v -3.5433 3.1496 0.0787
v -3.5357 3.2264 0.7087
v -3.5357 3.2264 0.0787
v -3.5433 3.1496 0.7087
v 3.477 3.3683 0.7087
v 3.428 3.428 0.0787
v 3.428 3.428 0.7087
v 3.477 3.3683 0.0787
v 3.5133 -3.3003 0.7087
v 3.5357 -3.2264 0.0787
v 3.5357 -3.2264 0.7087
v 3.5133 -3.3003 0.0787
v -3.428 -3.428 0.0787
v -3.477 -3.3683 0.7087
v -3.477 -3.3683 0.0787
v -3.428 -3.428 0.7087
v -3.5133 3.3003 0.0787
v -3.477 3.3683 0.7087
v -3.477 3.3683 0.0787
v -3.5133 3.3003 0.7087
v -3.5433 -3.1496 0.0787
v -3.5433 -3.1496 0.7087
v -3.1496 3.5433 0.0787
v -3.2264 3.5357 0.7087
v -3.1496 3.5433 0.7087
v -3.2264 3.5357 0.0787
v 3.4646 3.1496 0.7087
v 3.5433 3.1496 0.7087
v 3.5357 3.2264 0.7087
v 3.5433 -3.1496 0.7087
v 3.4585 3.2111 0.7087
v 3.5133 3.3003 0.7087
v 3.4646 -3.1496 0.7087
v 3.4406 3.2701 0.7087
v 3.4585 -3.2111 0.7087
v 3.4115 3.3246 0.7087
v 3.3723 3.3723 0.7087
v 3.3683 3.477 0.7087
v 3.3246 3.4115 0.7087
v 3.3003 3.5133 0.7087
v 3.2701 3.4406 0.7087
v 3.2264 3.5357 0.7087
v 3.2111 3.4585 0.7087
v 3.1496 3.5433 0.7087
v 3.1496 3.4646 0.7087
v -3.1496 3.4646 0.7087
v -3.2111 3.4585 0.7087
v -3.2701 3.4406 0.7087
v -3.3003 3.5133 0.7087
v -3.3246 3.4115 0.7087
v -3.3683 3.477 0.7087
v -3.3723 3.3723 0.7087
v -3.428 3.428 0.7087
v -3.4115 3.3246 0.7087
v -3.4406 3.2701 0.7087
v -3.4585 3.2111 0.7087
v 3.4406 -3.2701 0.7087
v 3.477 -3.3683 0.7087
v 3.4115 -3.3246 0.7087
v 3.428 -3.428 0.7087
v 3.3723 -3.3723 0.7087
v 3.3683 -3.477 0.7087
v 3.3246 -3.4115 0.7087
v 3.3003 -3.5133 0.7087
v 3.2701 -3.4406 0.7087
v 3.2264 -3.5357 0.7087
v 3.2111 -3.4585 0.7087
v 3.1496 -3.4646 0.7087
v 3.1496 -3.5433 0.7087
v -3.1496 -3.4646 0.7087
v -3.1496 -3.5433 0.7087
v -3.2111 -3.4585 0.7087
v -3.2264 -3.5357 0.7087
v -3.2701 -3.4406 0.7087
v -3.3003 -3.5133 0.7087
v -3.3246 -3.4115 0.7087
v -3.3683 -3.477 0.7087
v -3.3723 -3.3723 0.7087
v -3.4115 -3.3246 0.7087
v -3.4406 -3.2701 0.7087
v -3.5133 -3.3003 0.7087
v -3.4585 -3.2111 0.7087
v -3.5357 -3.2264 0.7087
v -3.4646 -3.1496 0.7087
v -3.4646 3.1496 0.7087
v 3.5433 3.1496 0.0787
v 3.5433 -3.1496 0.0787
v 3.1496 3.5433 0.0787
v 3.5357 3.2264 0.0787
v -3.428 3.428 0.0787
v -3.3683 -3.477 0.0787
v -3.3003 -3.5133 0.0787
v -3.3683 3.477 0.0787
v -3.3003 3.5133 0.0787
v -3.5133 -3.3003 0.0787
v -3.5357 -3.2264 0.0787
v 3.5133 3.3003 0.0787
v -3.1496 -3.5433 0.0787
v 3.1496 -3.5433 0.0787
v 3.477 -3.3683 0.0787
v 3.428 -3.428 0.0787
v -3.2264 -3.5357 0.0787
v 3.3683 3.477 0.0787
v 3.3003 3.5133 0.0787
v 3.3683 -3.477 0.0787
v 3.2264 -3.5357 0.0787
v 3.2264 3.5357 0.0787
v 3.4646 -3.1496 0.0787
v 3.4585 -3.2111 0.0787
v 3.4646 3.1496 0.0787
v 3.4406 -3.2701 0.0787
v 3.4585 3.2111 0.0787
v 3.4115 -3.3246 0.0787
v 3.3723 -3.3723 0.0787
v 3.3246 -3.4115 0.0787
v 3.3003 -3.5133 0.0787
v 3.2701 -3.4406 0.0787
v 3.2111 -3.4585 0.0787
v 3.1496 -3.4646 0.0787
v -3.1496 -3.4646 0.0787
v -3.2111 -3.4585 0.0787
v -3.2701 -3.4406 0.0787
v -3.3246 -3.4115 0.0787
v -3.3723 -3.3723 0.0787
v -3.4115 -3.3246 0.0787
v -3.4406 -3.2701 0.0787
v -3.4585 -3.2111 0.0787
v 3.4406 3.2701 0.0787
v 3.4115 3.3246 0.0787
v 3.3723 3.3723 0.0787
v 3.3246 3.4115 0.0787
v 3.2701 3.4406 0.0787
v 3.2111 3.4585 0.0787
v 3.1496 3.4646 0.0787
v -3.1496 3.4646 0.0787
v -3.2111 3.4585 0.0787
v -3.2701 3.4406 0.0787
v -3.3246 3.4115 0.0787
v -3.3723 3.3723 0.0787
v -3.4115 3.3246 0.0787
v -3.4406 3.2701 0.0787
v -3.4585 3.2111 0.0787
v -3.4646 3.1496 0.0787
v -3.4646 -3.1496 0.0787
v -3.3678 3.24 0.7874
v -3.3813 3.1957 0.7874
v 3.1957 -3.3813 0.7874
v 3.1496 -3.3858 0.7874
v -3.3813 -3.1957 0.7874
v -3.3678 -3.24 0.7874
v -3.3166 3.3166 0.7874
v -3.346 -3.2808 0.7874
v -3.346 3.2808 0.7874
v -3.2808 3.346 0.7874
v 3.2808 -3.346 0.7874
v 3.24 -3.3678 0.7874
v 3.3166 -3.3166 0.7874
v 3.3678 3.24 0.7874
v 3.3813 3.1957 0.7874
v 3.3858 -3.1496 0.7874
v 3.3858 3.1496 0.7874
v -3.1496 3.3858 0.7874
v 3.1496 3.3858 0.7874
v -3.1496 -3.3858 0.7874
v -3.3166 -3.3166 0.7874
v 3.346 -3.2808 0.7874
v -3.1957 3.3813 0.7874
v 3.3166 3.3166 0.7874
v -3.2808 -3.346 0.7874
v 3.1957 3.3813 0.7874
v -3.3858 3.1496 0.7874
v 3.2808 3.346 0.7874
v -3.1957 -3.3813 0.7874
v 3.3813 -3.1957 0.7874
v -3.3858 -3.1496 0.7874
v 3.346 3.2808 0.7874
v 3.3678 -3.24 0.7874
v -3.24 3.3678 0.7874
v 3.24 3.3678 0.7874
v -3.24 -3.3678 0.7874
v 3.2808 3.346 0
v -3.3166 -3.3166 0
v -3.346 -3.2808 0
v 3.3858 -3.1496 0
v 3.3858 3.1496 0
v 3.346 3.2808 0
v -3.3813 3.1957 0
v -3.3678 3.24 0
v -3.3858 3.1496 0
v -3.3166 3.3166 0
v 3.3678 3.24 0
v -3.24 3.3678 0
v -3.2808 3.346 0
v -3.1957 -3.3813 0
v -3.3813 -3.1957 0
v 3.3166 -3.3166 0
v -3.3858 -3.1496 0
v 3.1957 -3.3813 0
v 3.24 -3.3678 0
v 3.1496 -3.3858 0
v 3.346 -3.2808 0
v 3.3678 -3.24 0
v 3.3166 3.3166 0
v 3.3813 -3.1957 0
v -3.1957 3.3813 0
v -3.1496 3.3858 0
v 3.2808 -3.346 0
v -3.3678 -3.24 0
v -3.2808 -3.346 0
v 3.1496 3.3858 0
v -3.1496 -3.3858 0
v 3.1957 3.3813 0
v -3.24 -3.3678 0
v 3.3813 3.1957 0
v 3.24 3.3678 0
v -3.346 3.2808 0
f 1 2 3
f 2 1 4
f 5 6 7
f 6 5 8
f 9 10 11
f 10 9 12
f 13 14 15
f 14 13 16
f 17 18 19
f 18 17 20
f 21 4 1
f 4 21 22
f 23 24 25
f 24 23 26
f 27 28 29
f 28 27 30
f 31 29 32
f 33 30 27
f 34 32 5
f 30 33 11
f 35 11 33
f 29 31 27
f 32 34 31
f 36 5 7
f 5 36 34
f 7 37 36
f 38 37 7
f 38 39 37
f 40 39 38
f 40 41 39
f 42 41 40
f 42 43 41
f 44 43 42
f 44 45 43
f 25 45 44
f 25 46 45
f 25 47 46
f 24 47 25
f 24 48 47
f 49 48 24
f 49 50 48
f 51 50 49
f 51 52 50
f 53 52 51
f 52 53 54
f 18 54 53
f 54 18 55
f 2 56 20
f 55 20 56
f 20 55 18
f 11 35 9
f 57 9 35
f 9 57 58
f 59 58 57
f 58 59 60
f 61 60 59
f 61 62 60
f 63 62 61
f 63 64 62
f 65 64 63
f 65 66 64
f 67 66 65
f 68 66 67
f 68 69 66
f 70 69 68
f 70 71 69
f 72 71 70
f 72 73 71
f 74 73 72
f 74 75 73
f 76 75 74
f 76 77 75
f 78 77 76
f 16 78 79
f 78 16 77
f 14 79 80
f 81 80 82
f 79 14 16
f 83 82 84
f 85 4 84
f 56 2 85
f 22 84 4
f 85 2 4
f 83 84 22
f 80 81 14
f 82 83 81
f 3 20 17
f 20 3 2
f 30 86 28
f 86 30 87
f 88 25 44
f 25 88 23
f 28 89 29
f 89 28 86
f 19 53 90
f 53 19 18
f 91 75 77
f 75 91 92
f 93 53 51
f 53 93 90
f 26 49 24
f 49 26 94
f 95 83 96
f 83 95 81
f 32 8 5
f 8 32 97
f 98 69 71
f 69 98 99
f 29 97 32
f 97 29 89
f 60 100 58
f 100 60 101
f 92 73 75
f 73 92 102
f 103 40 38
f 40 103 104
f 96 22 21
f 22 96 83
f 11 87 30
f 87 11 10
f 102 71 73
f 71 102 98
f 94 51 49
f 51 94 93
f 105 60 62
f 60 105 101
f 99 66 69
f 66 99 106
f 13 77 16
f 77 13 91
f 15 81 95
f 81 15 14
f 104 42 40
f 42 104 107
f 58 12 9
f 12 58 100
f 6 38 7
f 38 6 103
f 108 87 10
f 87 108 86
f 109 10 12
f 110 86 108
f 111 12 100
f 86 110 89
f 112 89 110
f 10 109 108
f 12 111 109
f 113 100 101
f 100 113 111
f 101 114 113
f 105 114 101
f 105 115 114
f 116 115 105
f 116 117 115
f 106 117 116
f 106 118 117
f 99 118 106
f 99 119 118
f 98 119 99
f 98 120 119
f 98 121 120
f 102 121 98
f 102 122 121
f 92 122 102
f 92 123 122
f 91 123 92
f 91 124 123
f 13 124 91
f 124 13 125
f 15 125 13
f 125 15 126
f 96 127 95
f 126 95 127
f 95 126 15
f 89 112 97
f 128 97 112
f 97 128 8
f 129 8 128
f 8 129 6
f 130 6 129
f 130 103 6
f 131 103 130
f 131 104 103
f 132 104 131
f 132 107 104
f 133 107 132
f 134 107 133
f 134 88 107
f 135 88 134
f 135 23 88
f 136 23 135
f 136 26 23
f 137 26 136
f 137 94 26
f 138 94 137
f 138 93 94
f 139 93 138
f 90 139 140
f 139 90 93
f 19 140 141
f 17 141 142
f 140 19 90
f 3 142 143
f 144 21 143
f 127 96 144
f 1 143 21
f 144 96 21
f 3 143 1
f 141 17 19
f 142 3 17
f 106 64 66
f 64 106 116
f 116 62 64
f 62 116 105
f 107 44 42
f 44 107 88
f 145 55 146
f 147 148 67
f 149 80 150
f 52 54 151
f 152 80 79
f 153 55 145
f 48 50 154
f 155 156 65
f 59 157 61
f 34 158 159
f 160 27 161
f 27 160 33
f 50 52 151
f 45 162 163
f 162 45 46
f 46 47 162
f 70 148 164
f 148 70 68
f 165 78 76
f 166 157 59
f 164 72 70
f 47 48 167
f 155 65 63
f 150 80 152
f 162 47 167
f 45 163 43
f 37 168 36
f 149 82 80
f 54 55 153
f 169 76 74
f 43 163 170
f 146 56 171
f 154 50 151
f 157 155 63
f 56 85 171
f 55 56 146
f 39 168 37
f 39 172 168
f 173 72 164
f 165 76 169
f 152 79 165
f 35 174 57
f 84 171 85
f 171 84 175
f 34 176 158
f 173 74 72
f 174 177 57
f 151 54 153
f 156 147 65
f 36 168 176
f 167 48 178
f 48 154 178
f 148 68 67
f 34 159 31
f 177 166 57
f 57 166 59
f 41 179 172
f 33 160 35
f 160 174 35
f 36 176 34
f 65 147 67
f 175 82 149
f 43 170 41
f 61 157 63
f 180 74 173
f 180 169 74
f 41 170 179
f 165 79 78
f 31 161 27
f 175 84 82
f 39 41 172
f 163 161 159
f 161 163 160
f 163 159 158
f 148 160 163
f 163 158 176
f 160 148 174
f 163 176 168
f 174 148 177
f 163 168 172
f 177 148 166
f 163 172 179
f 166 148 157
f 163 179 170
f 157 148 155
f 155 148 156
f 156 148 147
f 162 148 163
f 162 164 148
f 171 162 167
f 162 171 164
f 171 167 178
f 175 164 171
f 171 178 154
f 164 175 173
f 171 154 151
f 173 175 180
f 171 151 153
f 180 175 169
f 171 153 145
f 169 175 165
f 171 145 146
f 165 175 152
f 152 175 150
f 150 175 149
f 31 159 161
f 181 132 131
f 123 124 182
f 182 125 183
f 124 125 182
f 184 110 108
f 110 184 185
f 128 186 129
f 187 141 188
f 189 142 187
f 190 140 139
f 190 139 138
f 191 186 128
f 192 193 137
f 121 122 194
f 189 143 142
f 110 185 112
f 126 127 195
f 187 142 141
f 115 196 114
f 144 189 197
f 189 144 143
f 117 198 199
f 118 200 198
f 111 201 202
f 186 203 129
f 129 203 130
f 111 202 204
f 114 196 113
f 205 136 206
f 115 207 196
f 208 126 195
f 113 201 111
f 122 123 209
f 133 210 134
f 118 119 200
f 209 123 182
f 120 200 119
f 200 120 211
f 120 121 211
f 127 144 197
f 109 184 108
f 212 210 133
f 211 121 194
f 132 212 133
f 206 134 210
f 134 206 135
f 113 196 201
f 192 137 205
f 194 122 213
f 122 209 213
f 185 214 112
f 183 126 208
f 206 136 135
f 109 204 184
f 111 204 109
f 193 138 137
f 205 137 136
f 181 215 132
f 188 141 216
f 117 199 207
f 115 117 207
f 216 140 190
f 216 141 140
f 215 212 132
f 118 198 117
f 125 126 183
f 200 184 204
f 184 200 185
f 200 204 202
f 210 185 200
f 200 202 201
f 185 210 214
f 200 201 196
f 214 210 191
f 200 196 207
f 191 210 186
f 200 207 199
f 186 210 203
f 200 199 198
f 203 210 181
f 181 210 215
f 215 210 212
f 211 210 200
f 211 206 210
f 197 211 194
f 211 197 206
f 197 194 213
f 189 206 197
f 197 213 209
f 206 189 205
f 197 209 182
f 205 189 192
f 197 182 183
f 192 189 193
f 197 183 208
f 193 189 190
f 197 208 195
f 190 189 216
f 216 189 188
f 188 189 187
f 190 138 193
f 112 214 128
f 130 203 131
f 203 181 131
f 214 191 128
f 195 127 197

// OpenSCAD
// file: defines.scad
L = 18.0;
W = 18.0;
H = 2.0;

/* Смещение вывода */
pin_d = 0.8;
pin_h = 2.0;
pin_ox = 0.0;
pin_oy = 1.8;

c_d = 4;  // Диаметр скругления

$fn = 32;

scale = 1/2.54;
// main file
include <defines.scad>

c_r = c_d / 2;

tb_chamfer = 0.2;
tb_chamfer_of = 0.2;

module corner() {
  translate([-L/2 + c_r/2, -W/2 + c_r/2, tb_chamfer]) cylinder(r=c_r/2, h=H-2*tb_chamfer, center=false);
}

module corner_top() {
  translate([-L/2 + c_r/2, -W/2 + c_r/2, H - tb_chamfer]) cylinder(r1=c_r/2-tb_chamfer_of, r2=c_r/2-tb_chamfer_of-tb_chamfer, h=tb_chamfer, center=false);
}

module corner_bot() {
  translate([-L/2 + c_r/2, -W/2 + c_r/2, 0]) cylinder(r2=c_r/2-tb_chamfer_of, r1=c_r/2-tb_chamfer_of-tb_chamfer, h=tb_chamfer, center=false);
}

module body(){
  hull() {
    corner();
    mirror([1,0,0]) corner();
    mirror([0,1,0]) corner();
    mirror([1,1,0]) corner();
  }

  hull() {
    corner_top();
    mirror([1,0,0]) corner_top();
    mirror([0,1,0]) corner_top();
    mirror([1,1,0]) corner_top();
  }

  hull() {
    corner_bot();
    mirror([1,0,0]) corner_bot();
    mirror([0,1,0]) corner_bot();
    mirror([1,1,0]) corner_bot();
  }


}

/*scale(scale) color("Tan Yellow") body();*/
/*scale(scale) color([197/255,173/255,135/255]) body(); // Tan Yellow  */
/*scale(scale) color("Pale silver") body();*/
scale(scale) color([0.83, 0.77, 0.75]) body();
